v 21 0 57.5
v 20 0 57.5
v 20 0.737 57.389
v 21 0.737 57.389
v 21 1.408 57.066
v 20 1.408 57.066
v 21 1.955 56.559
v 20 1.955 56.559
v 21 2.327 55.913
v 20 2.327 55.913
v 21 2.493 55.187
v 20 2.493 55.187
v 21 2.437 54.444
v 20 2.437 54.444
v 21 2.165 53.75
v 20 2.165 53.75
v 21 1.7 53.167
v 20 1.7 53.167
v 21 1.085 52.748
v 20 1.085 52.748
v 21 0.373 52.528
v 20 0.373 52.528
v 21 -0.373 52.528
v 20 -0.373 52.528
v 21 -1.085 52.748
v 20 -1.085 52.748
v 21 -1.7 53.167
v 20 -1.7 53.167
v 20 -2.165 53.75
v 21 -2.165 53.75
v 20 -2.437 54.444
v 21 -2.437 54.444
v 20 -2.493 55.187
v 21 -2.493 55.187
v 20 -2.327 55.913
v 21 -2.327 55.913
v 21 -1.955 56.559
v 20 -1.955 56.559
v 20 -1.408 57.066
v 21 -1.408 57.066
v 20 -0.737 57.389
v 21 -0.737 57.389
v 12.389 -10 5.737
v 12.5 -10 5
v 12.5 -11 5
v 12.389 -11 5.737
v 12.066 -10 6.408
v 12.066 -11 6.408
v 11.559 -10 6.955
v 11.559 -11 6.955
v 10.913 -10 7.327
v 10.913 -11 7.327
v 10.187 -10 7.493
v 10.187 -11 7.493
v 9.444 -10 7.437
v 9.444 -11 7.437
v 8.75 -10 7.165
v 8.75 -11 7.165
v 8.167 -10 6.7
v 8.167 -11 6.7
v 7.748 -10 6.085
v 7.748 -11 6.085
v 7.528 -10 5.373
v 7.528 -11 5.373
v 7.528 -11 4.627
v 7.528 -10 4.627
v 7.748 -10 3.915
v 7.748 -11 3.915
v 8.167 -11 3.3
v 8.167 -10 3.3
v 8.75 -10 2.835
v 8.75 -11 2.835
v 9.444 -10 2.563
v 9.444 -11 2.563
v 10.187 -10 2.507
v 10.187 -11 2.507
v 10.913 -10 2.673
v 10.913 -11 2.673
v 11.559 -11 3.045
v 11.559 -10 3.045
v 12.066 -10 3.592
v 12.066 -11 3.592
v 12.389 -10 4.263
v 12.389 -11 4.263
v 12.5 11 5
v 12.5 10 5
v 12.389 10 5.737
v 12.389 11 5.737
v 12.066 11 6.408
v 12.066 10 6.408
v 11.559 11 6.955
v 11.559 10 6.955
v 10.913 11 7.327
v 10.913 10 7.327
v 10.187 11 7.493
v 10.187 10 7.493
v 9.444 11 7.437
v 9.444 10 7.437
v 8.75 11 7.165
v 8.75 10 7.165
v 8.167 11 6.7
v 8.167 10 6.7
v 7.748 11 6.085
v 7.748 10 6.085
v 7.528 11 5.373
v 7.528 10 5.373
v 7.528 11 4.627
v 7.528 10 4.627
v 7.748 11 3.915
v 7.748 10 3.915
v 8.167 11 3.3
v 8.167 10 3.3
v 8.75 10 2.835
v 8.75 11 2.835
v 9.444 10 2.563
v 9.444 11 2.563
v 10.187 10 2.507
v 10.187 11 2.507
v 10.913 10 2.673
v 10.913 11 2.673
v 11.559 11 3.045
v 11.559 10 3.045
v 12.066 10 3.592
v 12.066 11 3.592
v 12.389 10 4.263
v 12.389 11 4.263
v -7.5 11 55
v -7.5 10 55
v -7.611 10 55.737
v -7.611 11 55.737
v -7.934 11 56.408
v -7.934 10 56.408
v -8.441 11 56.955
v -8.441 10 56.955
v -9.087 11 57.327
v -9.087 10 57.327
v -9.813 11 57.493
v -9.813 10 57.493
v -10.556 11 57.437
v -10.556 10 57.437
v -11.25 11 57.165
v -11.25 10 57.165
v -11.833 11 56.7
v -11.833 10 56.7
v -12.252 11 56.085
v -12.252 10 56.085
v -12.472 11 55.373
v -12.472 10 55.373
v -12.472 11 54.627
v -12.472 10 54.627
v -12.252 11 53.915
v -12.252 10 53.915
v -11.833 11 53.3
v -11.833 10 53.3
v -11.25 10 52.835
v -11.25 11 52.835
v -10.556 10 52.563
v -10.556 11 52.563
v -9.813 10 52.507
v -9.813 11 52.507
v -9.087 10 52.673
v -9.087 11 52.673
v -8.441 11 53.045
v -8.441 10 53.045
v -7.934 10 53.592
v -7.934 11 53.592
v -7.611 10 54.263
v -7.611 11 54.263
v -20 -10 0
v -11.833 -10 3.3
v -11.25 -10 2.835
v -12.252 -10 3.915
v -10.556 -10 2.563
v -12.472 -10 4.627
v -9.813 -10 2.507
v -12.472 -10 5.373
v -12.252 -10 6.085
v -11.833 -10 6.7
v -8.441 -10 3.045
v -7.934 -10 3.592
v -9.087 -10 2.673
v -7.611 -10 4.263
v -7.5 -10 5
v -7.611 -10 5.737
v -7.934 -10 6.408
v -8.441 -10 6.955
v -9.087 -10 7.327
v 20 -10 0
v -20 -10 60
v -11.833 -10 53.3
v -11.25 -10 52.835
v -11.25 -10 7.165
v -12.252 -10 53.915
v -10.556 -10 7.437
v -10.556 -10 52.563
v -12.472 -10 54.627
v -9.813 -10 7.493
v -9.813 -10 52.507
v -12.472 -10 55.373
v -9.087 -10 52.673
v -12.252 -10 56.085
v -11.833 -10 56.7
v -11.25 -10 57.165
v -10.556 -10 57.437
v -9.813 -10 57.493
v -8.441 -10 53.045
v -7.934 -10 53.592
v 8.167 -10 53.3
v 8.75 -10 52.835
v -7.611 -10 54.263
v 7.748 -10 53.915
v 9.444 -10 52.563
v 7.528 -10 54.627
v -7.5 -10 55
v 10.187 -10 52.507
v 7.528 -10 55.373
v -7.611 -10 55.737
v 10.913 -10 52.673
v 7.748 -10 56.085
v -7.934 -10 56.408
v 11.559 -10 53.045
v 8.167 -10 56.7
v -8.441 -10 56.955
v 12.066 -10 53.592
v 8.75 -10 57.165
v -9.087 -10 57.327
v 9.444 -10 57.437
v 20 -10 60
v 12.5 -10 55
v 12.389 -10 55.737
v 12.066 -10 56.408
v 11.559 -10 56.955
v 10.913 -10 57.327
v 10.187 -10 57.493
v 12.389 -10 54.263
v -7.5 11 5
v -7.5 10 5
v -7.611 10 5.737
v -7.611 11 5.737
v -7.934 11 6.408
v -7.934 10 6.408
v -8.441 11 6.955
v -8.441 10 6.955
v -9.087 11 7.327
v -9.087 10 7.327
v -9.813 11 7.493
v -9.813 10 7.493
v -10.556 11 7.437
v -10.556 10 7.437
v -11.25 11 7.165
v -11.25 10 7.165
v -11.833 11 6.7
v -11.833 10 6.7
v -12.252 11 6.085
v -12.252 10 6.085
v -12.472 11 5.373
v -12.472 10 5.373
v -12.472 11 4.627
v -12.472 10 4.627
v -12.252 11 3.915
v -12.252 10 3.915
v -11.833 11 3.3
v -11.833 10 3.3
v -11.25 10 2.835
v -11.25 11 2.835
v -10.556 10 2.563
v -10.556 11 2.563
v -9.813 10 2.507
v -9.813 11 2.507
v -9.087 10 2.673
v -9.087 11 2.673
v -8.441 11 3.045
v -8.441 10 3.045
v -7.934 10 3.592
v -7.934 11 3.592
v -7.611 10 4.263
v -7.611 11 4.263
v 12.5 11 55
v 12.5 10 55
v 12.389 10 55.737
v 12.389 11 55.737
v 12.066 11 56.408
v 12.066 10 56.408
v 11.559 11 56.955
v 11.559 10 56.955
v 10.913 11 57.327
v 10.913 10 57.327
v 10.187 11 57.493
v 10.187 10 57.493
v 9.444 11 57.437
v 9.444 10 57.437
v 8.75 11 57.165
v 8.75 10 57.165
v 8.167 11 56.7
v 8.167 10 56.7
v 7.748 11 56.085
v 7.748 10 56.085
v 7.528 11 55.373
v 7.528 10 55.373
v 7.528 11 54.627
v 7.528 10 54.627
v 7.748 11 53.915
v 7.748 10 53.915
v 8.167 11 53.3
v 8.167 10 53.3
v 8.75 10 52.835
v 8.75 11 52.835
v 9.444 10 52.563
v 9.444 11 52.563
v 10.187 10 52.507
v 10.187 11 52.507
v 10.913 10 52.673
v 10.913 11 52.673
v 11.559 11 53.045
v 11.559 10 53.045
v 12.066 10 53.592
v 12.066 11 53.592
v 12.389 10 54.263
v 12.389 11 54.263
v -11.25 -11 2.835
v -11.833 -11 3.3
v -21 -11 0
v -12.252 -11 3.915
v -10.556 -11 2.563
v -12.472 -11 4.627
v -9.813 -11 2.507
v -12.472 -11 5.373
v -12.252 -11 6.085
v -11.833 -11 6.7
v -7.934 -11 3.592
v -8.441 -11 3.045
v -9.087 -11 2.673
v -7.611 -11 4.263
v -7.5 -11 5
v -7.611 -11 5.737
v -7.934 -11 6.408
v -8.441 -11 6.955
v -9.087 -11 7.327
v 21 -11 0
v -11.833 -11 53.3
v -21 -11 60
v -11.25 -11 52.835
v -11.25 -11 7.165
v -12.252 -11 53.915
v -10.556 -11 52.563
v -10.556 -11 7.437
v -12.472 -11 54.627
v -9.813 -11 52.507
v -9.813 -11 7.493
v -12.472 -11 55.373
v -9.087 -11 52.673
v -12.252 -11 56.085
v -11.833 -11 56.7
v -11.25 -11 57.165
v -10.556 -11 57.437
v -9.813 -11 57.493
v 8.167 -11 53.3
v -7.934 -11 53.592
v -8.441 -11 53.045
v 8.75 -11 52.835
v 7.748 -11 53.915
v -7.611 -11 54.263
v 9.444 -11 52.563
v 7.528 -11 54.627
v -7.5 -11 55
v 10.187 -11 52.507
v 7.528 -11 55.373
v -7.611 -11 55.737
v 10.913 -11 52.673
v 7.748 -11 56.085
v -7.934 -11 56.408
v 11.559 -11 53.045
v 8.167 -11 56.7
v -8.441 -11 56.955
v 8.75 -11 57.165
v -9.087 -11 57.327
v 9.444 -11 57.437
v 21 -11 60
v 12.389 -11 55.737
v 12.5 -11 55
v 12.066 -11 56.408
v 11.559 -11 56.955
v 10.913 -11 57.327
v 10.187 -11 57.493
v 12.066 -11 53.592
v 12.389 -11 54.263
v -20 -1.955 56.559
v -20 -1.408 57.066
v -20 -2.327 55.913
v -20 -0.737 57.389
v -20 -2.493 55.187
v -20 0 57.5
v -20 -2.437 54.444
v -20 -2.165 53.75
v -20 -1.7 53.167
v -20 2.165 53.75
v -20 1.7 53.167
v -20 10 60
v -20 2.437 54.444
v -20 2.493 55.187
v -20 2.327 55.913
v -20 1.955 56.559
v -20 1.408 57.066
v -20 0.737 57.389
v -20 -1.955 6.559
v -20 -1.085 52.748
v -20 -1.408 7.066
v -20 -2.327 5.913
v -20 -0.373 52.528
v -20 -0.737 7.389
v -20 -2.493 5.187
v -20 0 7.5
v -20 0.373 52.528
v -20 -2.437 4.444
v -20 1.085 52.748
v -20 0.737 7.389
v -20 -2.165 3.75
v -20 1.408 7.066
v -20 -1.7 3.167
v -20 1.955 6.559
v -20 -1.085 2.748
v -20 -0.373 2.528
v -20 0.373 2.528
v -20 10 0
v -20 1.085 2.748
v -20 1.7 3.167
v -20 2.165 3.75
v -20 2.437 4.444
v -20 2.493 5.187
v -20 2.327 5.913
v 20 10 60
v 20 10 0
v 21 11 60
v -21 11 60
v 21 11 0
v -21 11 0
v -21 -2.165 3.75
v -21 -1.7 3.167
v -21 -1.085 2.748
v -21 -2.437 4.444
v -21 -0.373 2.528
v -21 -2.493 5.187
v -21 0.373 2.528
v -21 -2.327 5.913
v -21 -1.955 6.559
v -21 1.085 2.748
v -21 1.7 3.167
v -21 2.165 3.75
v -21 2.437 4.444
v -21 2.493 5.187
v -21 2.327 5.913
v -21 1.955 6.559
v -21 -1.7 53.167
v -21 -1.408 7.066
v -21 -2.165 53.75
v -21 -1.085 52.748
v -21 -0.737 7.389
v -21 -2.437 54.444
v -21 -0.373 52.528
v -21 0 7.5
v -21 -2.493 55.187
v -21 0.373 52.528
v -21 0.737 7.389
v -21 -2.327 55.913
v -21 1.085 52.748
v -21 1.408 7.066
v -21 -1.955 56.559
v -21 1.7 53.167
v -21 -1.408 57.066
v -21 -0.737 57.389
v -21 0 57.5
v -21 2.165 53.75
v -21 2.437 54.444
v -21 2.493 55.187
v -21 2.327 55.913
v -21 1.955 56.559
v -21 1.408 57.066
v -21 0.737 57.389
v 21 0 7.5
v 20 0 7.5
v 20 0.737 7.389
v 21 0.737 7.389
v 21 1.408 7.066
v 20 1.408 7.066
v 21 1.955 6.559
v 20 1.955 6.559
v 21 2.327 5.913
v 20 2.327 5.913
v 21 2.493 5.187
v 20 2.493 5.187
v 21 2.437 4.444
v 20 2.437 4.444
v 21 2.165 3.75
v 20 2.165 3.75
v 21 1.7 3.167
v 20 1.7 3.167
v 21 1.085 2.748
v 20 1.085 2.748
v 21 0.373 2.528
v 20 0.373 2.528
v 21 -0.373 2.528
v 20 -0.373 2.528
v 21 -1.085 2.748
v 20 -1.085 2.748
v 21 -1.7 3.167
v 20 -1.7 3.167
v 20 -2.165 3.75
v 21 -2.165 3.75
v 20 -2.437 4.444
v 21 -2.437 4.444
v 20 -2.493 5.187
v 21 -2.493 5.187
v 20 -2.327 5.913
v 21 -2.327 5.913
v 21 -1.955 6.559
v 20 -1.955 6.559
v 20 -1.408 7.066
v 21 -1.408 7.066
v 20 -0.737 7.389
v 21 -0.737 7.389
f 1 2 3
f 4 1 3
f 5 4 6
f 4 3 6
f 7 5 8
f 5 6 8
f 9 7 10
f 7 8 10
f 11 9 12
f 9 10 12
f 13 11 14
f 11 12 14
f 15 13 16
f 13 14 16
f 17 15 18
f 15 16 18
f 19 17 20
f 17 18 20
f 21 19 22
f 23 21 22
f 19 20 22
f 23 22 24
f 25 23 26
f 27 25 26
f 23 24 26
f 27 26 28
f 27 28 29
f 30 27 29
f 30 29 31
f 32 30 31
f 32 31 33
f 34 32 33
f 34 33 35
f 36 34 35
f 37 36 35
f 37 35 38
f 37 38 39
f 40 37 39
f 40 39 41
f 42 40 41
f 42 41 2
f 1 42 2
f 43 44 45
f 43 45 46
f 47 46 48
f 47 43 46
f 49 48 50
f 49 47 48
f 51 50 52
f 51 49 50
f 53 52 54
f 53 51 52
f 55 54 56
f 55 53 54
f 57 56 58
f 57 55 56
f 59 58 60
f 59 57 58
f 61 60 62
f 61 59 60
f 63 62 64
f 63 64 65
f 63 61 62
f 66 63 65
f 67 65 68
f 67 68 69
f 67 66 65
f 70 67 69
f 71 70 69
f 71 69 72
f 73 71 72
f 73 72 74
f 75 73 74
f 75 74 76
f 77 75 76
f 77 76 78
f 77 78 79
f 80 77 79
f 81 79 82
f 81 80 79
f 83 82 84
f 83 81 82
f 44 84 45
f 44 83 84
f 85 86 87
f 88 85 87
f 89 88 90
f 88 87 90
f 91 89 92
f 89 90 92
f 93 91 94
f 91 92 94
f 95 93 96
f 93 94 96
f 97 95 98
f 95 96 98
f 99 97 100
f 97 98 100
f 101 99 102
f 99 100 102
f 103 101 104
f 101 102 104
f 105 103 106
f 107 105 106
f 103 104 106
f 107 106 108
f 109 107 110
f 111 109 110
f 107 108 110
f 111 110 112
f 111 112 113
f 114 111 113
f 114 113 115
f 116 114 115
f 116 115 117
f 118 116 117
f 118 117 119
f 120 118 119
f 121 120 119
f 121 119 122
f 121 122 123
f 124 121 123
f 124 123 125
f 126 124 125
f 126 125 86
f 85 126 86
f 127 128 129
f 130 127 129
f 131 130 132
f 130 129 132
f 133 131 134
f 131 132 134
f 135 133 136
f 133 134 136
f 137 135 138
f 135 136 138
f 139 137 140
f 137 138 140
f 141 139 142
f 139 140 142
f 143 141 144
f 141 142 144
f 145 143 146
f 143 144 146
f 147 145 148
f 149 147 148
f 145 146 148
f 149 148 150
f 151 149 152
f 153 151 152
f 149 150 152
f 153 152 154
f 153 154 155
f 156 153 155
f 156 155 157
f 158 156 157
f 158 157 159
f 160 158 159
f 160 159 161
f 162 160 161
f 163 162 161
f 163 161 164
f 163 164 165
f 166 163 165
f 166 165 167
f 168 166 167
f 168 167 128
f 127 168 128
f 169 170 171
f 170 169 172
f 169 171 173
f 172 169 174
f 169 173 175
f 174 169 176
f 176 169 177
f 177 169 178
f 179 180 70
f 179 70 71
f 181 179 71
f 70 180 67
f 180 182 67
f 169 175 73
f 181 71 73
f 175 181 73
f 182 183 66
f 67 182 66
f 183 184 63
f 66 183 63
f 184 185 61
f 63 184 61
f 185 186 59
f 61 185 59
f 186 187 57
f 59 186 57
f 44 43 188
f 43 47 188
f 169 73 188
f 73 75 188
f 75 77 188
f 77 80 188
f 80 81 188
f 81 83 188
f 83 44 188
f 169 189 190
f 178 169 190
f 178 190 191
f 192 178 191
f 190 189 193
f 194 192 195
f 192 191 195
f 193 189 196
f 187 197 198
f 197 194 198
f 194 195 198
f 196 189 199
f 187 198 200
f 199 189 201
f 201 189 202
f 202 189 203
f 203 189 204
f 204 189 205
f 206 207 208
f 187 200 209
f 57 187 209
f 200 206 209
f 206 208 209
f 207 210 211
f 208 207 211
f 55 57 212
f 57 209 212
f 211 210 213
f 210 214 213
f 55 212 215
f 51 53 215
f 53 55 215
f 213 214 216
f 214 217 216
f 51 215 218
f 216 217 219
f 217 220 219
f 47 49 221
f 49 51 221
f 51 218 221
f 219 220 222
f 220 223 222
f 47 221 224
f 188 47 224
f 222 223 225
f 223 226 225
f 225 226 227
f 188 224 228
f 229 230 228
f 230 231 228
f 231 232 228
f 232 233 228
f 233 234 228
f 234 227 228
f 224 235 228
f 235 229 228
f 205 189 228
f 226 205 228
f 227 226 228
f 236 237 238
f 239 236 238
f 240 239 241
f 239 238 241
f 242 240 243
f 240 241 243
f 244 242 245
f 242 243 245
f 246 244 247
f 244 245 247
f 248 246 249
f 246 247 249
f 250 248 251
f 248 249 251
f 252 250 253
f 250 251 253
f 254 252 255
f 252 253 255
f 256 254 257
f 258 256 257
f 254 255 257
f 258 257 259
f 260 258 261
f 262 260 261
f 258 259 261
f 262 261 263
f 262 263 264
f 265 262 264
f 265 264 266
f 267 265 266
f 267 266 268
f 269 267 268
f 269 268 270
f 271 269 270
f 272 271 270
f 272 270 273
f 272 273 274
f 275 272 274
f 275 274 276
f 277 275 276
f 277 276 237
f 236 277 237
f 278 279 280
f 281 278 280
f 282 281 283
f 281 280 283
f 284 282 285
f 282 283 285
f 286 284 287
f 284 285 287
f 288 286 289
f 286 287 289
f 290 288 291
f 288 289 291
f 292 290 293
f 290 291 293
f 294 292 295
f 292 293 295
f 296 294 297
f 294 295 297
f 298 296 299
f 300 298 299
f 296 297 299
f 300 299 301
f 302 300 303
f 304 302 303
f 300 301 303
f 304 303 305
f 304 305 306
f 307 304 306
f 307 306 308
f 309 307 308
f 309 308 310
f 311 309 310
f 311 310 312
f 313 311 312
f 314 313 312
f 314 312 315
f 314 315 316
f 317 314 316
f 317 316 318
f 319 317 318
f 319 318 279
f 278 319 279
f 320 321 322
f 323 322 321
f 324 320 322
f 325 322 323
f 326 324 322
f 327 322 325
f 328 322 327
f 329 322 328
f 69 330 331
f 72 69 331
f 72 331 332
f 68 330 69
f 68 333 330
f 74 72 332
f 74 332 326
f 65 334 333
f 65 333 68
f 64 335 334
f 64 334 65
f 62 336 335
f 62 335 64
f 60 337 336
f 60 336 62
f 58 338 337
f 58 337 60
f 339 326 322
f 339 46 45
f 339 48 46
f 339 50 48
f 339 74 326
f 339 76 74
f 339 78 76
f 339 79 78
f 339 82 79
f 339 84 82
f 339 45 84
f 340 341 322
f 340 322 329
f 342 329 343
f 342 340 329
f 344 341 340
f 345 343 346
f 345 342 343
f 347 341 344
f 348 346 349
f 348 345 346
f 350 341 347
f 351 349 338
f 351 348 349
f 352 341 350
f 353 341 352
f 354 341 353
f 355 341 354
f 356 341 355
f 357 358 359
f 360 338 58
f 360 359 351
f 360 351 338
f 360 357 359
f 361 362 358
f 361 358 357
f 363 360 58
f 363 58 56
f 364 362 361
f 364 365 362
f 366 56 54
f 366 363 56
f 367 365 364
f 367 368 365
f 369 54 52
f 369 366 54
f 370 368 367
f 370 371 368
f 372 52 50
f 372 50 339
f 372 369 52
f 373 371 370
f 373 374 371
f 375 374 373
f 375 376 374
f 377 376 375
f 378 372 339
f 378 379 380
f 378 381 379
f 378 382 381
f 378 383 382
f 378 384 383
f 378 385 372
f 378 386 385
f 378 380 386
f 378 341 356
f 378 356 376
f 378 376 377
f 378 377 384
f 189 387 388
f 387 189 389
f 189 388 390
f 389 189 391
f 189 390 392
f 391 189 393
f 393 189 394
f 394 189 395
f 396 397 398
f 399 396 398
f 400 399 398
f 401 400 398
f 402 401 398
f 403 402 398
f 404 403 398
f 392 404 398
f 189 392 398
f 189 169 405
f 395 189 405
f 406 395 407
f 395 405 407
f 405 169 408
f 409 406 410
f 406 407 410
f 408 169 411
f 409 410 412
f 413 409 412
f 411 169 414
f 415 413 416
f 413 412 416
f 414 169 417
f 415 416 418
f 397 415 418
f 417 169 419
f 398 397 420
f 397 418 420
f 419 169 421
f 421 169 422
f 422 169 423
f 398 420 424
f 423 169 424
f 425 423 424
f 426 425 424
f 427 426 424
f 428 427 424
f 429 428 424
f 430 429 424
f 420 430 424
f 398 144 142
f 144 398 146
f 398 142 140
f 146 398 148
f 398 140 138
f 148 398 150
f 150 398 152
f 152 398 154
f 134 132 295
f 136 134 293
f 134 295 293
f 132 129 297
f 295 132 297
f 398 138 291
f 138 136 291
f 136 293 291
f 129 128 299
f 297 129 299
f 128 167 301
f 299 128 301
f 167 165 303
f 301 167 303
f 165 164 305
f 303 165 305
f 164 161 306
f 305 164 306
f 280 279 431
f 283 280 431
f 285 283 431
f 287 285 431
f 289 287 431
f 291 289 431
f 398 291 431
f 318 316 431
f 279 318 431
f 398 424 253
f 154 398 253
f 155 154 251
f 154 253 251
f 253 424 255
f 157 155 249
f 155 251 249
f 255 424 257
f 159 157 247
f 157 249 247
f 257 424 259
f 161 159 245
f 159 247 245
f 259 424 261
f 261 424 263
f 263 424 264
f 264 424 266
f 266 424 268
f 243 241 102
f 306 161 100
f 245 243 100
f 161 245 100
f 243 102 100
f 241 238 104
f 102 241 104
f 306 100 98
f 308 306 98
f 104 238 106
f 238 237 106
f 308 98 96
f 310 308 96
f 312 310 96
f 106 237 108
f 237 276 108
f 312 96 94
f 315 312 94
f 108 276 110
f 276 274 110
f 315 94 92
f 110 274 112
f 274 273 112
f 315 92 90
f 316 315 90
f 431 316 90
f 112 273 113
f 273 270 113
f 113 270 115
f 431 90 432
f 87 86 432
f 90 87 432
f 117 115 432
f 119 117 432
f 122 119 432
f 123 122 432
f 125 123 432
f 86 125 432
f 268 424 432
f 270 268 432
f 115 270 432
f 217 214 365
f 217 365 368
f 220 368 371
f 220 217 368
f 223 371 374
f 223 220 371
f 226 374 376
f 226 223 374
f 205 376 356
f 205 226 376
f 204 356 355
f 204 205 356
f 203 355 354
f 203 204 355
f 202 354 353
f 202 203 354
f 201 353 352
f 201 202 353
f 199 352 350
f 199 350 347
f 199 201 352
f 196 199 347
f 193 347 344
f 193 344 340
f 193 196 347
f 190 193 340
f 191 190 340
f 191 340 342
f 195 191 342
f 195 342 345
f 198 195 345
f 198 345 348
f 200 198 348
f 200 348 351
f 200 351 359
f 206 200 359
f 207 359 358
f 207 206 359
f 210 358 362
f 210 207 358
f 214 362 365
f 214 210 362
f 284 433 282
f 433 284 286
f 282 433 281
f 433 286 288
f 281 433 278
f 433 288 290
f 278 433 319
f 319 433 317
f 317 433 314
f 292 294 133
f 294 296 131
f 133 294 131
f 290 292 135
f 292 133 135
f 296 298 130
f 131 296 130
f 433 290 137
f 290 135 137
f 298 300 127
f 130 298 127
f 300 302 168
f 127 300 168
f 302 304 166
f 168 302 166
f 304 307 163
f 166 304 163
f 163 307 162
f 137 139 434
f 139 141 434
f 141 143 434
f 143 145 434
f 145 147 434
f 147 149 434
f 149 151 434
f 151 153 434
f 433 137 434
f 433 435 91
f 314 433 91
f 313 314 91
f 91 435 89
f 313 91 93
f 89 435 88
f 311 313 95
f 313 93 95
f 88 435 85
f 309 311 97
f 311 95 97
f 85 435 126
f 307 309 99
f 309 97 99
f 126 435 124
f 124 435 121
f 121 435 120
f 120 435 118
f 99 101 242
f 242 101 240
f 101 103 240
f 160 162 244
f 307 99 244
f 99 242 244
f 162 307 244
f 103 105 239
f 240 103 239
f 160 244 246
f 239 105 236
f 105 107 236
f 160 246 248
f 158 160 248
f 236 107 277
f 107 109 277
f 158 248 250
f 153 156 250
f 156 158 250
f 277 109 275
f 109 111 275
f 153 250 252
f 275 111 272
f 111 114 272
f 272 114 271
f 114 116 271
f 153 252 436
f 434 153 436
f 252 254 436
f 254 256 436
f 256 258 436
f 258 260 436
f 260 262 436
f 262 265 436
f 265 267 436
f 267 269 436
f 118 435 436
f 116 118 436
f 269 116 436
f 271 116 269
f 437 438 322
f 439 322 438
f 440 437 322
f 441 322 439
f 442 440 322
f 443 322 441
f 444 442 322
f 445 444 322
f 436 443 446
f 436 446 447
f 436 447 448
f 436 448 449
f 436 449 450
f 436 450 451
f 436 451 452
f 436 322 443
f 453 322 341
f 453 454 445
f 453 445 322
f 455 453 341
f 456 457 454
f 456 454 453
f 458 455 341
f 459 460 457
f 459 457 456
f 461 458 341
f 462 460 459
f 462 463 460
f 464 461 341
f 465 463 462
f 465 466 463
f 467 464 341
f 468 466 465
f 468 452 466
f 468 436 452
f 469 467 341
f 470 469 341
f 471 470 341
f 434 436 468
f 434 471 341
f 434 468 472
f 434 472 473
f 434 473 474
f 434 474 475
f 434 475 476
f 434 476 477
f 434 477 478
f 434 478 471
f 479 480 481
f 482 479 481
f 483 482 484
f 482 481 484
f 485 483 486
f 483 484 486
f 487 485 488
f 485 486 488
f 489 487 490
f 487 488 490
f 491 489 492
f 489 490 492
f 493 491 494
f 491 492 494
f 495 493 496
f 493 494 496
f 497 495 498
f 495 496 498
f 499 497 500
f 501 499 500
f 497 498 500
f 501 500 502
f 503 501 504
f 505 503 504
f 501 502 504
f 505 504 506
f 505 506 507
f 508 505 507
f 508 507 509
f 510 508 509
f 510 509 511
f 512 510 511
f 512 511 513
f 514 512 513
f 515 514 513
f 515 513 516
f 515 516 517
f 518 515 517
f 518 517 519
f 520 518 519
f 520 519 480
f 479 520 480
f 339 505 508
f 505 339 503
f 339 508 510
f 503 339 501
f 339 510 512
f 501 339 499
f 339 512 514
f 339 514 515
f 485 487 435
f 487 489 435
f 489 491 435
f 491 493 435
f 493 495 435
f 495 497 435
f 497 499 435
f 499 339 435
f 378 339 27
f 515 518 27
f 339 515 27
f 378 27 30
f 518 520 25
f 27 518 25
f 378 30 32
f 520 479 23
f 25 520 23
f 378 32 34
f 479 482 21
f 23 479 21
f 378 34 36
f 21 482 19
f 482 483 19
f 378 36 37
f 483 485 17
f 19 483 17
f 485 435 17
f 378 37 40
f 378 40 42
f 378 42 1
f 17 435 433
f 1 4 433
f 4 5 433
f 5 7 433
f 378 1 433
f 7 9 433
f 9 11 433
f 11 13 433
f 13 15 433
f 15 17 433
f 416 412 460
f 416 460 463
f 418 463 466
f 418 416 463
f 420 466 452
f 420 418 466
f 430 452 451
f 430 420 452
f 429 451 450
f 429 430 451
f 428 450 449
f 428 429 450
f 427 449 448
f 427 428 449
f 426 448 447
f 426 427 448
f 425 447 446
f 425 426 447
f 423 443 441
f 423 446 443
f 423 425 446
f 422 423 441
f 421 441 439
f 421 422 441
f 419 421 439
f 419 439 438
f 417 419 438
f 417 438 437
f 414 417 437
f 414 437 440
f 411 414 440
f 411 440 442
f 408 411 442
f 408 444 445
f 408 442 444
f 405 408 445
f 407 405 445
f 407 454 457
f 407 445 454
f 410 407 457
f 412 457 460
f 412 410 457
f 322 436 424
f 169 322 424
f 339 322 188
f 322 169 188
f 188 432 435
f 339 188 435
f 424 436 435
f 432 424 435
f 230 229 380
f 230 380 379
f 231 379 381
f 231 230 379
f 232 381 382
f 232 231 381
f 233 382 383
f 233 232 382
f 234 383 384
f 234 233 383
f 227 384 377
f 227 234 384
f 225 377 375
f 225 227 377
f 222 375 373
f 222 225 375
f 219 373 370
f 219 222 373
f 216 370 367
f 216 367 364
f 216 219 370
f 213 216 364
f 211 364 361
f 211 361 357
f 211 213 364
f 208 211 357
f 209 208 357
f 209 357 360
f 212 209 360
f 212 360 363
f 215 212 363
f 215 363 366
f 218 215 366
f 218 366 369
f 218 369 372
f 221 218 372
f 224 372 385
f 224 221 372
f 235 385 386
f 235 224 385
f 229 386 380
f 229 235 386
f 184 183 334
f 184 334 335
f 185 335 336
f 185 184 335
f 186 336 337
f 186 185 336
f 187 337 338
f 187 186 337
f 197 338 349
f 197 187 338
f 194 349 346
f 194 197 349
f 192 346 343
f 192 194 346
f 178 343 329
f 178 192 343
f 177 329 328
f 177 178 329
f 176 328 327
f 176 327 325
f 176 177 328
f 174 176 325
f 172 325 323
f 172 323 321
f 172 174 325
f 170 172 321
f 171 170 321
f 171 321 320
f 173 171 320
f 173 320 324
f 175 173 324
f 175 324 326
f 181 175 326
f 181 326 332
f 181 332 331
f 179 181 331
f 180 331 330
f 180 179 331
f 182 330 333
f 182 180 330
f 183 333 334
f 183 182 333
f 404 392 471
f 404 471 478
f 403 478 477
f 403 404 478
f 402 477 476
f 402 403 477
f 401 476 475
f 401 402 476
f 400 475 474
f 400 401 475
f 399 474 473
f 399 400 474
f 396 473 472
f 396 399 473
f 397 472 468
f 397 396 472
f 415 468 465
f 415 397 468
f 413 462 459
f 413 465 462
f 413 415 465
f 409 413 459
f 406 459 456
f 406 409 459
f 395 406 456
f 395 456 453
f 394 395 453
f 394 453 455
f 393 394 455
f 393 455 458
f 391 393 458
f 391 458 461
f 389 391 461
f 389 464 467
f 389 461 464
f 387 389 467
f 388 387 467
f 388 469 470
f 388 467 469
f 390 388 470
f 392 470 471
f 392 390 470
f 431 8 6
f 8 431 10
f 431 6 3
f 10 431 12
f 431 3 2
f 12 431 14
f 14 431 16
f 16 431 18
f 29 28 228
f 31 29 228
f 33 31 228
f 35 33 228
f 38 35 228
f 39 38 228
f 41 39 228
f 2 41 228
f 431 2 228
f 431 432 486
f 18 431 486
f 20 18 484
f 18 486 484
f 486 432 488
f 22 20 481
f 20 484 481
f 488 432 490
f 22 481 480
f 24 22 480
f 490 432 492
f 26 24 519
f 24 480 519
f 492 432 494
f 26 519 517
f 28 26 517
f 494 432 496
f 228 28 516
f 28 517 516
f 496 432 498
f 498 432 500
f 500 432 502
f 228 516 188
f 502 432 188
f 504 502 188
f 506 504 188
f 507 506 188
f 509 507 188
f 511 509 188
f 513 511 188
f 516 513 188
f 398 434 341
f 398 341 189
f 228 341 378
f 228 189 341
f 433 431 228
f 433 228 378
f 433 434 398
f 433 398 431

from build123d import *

# Parameters (mm, degrees)
BOSS_EXTRUDE1_DEPTH     = 60
SKETCH2_R               = 2.5
CUT_EXTRUDE1_DEPTH      = 2
SKETCH3_R               = 2.5
CUT_EXTRUDE2_DEPTH      = 42
CUT_EXTRUDE2_DEPTH_BACK = 2
SKETCH4_W               = 42
SKETCH4_H               = 60
SKETCH4_R               = 2.5
BOSS_EXTRUDE2_DEPTH     = 1


with BuildPart() as part:
    # Sketch1 → Boss-Extrude1 (new body)
    with BuildSketch(Plane.XY):
        Polygon((-20, -10), (-20, 10), (20, 10), (20, -10), (21, -10), (21, 11), (-21, 11), (-21, -10), align=None)
    extrude(amount=BOSS_EXTRUDE1_DEPTH)

    # Sketch2 → Cut-Extrude1 (cut, through all)
    with BuildSketch(Plane.XZ.offset(-10)):
        with Locations((-10, 5)):
            Circle(SKETCH2_R)
        with Locations((10, 5)):
            Circle(SKETCH2_R)
        with Locations((10, 55)):
            Circle(SKETCH2_R)
        with Locations((-10, 55)):
            Circle(SKETCH2_R)
    extrude(amount=-CUT_EXTRUDE1_DEPTH, mode=Mode.SUBTRACT)

    # Sketch3 → Cut-Extrude2 (cut, two sides)
    with BuildSketch(Plane.ZY.offset(-20)) as cut_extrude2_sk:
        with Locations((5, 0)):
            Circle(SKETCH3_R)
        with Locations((55, 0)):
            Circle(SKETCH3_R)
    extrude(amount=CUT_EXTRUDE2_DEPTH, mode=Mode.SUBTRACT)
    extrude(cut_extrude2_sk.sketch, amount=-CUT_EXTRUDE2_DEPTH_BACK, mode=Mode.SUBTRACT)

    # Sketch4 → Boss-Extrude2 (add)
    with BuildSketch(Plane.XZ.offset(10)):
        with Locations((0, 30)):
            Rectangle(SKETCH4_W, SKETCH4_H)
        with Locations((-10, 5)):
            Circle(SKETCH4_R, mode=Mode.SUBTRACT)
        with Locations((-10, 55)):
            Circle(SKETCH4_R, mode=Mode.SUBTRACT)
        with Locations((10, 55)):
            Circle(SKETCH4_R, mode=Mode.SUBTRACT)
        with Locations((10, 5)):
            Circle(SKETCH4_R, mode=Mode.SUBTRACT)
    extrude(amount=BOSS_EXTRUDE2_DEPTH)


solid = part.part
